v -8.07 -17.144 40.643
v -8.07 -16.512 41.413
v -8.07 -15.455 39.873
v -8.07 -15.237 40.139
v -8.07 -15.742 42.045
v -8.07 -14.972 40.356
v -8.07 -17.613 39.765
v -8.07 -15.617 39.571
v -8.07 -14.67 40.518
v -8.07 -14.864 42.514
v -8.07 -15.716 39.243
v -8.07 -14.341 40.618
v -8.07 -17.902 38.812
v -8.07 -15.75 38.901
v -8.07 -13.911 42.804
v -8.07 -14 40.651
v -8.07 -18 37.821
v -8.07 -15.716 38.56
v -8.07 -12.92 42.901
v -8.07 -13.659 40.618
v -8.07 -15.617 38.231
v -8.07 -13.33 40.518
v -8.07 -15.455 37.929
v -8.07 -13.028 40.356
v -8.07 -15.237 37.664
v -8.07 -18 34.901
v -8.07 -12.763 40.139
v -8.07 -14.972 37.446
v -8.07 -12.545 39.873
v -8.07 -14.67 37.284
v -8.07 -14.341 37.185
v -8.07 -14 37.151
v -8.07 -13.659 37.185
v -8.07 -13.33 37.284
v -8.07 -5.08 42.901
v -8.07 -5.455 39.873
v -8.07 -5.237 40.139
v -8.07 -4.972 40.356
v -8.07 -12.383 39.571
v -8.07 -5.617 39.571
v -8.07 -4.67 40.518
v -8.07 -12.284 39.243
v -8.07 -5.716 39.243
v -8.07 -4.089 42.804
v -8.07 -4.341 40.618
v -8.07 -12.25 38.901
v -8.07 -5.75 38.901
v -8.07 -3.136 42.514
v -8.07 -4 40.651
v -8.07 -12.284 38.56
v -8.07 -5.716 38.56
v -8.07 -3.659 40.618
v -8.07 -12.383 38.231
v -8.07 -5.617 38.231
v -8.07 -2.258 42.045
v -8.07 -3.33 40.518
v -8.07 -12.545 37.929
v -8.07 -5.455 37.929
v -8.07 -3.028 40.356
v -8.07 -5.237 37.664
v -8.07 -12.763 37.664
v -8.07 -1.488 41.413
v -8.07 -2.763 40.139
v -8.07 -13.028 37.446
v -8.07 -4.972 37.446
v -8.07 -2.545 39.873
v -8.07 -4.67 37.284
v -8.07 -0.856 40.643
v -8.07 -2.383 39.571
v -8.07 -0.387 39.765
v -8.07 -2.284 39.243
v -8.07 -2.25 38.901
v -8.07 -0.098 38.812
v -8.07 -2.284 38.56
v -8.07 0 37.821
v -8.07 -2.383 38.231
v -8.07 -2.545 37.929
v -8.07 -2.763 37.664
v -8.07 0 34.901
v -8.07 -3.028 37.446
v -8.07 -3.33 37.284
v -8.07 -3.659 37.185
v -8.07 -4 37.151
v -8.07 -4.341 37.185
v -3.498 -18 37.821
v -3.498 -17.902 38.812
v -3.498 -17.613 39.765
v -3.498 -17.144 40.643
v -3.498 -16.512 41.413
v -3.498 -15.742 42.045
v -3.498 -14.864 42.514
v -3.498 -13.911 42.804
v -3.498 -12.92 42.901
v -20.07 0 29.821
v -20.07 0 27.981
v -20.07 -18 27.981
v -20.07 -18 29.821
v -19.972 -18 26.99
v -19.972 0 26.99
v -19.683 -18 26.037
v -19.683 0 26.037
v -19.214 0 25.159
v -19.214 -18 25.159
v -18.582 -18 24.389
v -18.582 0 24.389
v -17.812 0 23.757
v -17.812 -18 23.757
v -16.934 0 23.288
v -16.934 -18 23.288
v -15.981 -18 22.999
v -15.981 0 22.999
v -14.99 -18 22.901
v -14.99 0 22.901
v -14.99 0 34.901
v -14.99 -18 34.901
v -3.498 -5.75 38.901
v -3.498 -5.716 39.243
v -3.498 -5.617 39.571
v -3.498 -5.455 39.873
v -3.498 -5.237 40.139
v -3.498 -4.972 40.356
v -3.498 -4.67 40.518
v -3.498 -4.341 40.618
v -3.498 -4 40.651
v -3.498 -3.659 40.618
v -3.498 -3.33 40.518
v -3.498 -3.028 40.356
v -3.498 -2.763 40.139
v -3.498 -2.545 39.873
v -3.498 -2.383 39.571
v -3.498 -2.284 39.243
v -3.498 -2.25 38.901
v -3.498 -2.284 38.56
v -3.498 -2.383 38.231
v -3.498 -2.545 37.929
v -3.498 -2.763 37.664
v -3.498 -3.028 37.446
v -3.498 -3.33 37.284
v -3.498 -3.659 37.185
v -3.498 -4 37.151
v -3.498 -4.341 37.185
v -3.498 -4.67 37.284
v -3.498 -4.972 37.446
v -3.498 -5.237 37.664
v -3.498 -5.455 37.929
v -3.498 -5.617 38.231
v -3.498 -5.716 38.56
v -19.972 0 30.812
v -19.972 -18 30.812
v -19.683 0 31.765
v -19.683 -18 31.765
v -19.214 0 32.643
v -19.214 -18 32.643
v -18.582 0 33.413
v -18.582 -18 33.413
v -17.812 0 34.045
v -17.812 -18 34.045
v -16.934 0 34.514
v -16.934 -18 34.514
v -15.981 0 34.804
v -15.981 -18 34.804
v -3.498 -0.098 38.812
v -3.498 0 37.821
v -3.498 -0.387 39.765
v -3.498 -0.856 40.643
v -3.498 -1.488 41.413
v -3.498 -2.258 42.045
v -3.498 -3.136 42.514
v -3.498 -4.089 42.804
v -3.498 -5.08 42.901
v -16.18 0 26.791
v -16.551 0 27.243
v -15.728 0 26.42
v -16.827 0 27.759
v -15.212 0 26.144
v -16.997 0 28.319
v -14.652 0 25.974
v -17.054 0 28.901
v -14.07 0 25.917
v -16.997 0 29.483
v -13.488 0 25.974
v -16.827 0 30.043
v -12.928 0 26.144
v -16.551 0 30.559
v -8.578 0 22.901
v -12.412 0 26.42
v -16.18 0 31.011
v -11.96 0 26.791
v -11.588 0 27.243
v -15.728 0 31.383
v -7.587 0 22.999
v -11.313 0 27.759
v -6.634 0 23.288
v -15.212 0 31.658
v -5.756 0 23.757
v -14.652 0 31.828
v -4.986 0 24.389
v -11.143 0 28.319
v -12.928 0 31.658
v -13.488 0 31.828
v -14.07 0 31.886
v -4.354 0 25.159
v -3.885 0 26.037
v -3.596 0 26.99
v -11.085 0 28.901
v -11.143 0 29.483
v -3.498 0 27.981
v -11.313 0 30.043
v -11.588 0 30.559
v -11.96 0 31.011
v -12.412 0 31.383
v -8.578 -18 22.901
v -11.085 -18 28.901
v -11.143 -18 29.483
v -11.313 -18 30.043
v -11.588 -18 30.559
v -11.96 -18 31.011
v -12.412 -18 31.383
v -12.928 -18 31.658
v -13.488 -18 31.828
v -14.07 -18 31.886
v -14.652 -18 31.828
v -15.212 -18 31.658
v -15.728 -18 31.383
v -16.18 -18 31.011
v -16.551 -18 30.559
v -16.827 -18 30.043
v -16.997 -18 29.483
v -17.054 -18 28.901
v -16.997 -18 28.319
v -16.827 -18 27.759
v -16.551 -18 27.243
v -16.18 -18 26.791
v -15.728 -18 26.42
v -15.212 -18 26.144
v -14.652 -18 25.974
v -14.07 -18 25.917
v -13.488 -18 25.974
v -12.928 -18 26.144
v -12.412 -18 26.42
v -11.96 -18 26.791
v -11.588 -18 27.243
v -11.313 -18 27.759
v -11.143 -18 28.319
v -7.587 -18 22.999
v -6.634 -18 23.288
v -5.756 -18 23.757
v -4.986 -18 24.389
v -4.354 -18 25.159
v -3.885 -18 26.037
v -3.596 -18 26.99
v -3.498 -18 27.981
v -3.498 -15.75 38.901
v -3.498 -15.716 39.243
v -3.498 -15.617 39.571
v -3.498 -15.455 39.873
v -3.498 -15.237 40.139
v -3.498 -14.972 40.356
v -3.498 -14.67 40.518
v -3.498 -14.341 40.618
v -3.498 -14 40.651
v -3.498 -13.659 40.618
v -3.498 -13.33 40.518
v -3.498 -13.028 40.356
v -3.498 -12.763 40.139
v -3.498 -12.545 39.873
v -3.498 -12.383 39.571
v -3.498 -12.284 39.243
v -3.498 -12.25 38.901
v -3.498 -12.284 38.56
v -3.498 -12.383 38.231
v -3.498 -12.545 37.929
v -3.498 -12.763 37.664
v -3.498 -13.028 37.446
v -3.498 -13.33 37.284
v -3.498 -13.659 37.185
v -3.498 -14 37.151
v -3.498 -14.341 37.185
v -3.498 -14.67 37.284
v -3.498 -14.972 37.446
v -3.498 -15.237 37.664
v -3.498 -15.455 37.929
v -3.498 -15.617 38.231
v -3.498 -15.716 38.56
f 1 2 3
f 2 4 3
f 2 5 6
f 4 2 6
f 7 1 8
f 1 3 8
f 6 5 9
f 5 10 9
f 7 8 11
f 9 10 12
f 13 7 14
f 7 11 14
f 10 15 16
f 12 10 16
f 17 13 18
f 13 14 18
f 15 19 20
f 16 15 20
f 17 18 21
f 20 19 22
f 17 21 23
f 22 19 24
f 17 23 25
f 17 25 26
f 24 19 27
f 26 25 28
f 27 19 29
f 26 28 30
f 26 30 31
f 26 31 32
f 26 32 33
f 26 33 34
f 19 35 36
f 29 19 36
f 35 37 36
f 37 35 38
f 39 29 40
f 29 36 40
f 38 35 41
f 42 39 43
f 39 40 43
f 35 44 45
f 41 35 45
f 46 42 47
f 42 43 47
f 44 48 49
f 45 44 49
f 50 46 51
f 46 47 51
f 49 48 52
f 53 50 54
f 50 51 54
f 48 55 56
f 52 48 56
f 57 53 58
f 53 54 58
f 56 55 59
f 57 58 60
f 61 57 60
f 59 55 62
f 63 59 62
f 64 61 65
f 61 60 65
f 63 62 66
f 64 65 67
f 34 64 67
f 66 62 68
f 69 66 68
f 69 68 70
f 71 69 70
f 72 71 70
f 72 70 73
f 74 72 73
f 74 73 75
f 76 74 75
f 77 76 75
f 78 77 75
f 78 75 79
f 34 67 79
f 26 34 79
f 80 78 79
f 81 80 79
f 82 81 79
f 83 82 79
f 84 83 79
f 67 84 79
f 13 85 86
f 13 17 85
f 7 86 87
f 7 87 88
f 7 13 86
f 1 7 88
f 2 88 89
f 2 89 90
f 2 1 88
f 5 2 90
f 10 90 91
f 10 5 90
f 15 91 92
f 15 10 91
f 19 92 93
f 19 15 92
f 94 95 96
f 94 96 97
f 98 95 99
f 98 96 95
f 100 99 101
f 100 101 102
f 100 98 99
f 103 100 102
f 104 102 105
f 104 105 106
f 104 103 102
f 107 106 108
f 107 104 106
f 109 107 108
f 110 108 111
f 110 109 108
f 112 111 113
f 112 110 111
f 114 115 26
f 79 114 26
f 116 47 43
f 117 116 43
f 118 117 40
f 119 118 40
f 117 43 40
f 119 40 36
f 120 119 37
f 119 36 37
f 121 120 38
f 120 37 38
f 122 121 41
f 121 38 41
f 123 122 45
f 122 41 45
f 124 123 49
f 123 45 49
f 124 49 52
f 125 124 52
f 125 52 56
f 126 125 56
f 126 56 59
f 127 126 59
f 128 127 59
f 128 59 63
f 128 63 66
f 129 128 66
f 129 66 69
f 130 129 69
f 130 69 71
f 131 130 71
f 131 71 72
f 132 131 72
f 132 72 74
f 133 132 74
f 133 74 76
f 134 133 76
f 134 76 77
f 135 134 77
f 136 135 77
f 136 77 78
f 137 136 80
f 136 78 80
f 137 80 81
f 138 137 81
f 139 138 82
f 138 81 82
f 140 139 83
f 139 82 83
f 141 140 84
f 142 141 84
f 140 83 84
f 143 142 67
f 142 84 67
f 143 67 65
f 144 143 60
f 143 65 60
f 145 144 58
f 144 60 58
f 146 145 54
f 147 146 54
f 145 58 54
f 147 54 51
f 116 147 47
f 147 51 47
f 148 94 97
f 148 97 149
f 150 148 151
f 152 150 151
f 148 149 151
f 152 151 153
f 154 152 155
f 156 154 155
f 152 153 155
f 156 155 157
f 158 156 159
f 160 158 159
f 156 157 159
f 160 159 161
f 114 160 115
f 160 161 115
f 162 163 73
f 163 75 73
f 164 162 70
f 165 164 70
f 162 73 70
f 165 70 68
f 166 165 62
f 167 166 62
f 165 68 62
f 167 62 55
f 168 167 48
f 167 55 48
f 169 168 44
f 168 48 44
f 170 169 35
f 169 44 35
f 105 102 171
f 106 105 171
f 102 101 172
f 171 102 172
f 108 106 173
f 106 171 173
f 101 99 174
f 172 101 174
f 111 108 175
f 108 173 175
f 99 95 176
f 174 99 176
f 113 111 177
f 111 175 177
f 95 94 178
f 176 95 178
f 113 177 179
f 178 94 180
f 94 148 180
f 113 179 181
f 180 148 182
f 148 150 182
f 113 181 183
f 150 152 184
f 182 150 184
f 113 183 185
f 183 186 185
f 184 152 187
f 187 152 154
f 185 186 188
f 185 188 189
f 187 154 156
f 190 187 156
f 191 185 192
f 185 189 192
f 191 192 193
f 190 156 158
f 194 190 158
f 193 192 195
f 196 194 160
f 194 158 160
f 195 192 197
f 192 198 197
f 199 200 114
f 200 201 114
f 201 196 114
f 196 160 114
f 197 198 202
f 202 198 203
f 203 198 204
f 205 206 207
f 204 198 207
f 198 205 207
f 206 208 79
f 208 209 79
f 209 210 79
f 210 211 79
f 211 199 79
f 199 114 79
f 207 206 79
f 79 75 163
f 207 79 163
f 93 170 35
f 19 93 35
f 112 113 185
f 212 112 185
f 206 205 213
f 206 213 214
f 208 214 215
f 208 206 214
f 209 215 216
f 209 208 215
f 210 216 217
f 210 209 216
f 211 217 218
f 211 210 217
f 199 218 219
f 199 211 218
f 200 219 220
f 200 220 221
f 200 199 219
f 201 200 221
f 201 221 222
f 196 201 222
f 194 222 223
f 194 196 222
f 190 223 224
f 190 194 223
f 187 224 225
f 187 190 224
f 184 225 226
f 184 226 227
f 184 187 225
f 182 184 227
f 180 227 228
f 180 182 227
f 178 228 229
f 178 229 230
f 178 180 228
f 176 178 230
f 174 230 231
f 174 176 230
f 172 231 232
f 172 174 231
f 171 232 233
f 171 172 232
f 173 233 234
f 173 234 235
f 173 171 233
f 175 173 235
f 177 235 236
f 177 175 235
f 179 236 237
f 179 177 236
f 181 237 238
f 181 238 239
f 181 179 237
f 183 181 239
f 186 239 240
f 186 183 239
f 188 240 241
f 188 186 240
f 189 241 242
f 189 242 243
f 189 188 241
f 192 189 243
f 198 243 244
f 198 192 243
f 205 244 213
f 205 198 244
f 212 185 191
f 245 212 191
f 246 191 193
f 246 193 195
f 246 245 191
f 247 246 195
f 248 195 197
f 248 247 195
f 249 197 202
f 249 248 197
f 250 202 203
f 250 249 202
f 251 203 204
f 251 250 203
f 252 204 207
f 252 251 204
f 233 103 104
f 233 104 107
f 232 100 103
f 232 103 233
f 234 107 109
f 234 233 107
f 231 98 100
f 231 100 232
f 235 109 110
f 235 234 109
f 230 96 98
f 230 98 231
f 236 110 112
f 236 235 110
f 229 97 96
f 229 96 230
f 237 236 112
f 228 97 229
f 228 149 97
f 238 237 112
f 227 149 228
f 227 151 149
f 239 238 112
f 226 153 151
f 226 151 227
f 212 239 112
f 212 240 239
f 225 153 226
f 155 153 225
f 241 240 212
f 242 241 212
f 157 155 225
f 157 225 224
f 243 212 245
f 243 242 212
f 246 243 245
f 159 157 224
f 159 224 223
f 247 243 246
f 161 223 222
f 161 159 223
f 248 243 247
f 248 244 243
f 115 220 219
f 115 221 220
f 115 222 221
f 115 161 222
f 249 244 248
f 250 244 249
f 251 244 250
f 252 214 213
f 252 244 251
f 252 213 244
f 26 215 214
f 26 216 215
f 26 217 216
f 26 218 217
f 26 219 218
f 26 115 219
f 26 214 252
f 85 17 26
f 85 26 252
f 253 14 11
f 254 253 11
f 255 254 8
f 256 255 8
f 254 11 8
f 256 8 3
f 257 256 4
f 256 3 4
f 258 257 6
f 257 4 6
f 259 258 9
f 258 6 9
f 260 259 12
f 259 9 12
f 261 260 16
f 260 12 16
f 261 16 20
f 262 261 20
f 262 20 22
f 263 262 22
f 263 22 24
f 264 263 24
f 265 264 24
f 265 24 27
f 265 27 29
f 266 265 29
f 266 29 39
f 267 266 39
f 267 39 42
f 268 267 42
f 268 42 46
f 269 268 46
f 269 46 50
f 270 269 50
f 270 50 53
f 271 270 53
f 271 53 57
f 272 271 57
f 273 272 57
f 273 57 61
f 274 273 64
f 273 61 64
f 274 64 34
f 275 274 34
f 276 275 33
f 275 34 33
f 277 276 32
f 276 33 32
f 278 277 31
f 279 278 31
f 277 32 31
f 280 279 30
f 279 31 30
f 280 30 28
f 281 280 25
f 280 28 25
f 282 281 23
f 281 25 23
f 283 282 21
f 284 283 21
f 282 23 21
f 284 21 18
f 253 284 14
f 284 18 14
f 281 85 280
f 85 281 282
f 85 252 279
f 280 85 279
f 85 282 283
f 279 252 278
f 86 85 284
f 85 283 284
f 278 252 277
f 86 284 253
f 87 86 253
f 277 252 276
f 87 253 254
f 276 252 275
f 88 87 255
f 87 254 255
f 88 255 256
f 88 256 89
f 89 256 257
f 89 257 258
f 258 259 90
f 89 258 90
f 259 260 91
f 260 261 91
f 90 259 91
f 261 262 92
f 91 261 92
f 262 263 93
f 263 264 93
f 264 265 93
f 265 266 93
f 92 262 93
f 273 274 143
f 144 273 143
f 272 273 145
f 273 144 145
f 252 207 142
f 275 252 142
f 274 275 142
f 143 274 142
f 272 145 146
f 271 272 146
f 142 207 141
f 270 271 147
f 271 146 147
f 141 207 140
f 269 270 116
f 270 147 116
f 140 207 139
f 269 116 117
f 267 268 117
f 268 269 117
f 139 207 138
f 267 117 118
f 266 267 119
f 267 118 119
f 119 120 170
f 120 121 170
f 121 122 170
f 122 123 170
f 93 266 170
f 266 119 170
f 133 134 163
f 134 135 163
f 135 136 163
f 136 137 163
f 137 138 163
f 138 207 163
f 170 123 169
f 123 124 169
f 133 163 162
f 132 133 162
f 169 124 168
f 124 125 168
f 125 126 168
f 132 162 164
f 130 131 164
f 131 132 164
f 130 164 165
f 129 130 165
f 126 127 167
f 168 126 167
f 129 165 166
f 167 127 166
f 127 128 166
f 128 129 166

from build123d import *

# Parameters (mm, degrees)
F0_W     = 12
F0_H     = 12
F0_R     = 2.9845
F1_DEPTH = 18
F2_R     = 1.75
F3_DEPTH = 25.4
F4_R     = 5.08


with BuildPart() as f1:
    # F0 (on Front) → F1 (new body)
    with BuildSketch(Plane.XZ):
        with Locations((-14.06993, 28.901128)):
            Rectangle(F0_W, F0_H)
        with Locations((-14.06993, 28.901128)):
            Circle(F0_R, mode=Mode.SUBTRACT)
        Polygon((-8.06993, 42.901128), (-8.06993, 34.901128), (-8.06993, 22.901128), (-3.49793, 22.901128), (-3.49793, 42.901128), align=None)
    extrude(amount=F1_DEPTH)

    # F2 (on face) → F3 (cut)
    with BuildSketch(Plane(origin=(-8.06993, 0, 0), x_dir=(0, -1, 0), z_dir=(-1, 0, 0))):
        with Locations((4, 38.901128)):
            Circle(F2_R)
        with Locations((14, 38.901128)):
            Circle(F2_R)
    extrude(amount=-F3_DEPTH, mode=Mode.SUBTRACT)

    # F4
    f4_edges = [f1.edges().sort_by_distance(p)[0] for p in [
        (-5.78393, 0, 42.901128),
        (-5.78393, -18, 42.901128),
        (-20.06993, -9, 34.901128),
        (-20.06993, -9, 22.901128),
        (-3.49793, -9, 22.901128),
    ]]
    fillet(f4_edges, radius=F4_R)


solid = f1.part
